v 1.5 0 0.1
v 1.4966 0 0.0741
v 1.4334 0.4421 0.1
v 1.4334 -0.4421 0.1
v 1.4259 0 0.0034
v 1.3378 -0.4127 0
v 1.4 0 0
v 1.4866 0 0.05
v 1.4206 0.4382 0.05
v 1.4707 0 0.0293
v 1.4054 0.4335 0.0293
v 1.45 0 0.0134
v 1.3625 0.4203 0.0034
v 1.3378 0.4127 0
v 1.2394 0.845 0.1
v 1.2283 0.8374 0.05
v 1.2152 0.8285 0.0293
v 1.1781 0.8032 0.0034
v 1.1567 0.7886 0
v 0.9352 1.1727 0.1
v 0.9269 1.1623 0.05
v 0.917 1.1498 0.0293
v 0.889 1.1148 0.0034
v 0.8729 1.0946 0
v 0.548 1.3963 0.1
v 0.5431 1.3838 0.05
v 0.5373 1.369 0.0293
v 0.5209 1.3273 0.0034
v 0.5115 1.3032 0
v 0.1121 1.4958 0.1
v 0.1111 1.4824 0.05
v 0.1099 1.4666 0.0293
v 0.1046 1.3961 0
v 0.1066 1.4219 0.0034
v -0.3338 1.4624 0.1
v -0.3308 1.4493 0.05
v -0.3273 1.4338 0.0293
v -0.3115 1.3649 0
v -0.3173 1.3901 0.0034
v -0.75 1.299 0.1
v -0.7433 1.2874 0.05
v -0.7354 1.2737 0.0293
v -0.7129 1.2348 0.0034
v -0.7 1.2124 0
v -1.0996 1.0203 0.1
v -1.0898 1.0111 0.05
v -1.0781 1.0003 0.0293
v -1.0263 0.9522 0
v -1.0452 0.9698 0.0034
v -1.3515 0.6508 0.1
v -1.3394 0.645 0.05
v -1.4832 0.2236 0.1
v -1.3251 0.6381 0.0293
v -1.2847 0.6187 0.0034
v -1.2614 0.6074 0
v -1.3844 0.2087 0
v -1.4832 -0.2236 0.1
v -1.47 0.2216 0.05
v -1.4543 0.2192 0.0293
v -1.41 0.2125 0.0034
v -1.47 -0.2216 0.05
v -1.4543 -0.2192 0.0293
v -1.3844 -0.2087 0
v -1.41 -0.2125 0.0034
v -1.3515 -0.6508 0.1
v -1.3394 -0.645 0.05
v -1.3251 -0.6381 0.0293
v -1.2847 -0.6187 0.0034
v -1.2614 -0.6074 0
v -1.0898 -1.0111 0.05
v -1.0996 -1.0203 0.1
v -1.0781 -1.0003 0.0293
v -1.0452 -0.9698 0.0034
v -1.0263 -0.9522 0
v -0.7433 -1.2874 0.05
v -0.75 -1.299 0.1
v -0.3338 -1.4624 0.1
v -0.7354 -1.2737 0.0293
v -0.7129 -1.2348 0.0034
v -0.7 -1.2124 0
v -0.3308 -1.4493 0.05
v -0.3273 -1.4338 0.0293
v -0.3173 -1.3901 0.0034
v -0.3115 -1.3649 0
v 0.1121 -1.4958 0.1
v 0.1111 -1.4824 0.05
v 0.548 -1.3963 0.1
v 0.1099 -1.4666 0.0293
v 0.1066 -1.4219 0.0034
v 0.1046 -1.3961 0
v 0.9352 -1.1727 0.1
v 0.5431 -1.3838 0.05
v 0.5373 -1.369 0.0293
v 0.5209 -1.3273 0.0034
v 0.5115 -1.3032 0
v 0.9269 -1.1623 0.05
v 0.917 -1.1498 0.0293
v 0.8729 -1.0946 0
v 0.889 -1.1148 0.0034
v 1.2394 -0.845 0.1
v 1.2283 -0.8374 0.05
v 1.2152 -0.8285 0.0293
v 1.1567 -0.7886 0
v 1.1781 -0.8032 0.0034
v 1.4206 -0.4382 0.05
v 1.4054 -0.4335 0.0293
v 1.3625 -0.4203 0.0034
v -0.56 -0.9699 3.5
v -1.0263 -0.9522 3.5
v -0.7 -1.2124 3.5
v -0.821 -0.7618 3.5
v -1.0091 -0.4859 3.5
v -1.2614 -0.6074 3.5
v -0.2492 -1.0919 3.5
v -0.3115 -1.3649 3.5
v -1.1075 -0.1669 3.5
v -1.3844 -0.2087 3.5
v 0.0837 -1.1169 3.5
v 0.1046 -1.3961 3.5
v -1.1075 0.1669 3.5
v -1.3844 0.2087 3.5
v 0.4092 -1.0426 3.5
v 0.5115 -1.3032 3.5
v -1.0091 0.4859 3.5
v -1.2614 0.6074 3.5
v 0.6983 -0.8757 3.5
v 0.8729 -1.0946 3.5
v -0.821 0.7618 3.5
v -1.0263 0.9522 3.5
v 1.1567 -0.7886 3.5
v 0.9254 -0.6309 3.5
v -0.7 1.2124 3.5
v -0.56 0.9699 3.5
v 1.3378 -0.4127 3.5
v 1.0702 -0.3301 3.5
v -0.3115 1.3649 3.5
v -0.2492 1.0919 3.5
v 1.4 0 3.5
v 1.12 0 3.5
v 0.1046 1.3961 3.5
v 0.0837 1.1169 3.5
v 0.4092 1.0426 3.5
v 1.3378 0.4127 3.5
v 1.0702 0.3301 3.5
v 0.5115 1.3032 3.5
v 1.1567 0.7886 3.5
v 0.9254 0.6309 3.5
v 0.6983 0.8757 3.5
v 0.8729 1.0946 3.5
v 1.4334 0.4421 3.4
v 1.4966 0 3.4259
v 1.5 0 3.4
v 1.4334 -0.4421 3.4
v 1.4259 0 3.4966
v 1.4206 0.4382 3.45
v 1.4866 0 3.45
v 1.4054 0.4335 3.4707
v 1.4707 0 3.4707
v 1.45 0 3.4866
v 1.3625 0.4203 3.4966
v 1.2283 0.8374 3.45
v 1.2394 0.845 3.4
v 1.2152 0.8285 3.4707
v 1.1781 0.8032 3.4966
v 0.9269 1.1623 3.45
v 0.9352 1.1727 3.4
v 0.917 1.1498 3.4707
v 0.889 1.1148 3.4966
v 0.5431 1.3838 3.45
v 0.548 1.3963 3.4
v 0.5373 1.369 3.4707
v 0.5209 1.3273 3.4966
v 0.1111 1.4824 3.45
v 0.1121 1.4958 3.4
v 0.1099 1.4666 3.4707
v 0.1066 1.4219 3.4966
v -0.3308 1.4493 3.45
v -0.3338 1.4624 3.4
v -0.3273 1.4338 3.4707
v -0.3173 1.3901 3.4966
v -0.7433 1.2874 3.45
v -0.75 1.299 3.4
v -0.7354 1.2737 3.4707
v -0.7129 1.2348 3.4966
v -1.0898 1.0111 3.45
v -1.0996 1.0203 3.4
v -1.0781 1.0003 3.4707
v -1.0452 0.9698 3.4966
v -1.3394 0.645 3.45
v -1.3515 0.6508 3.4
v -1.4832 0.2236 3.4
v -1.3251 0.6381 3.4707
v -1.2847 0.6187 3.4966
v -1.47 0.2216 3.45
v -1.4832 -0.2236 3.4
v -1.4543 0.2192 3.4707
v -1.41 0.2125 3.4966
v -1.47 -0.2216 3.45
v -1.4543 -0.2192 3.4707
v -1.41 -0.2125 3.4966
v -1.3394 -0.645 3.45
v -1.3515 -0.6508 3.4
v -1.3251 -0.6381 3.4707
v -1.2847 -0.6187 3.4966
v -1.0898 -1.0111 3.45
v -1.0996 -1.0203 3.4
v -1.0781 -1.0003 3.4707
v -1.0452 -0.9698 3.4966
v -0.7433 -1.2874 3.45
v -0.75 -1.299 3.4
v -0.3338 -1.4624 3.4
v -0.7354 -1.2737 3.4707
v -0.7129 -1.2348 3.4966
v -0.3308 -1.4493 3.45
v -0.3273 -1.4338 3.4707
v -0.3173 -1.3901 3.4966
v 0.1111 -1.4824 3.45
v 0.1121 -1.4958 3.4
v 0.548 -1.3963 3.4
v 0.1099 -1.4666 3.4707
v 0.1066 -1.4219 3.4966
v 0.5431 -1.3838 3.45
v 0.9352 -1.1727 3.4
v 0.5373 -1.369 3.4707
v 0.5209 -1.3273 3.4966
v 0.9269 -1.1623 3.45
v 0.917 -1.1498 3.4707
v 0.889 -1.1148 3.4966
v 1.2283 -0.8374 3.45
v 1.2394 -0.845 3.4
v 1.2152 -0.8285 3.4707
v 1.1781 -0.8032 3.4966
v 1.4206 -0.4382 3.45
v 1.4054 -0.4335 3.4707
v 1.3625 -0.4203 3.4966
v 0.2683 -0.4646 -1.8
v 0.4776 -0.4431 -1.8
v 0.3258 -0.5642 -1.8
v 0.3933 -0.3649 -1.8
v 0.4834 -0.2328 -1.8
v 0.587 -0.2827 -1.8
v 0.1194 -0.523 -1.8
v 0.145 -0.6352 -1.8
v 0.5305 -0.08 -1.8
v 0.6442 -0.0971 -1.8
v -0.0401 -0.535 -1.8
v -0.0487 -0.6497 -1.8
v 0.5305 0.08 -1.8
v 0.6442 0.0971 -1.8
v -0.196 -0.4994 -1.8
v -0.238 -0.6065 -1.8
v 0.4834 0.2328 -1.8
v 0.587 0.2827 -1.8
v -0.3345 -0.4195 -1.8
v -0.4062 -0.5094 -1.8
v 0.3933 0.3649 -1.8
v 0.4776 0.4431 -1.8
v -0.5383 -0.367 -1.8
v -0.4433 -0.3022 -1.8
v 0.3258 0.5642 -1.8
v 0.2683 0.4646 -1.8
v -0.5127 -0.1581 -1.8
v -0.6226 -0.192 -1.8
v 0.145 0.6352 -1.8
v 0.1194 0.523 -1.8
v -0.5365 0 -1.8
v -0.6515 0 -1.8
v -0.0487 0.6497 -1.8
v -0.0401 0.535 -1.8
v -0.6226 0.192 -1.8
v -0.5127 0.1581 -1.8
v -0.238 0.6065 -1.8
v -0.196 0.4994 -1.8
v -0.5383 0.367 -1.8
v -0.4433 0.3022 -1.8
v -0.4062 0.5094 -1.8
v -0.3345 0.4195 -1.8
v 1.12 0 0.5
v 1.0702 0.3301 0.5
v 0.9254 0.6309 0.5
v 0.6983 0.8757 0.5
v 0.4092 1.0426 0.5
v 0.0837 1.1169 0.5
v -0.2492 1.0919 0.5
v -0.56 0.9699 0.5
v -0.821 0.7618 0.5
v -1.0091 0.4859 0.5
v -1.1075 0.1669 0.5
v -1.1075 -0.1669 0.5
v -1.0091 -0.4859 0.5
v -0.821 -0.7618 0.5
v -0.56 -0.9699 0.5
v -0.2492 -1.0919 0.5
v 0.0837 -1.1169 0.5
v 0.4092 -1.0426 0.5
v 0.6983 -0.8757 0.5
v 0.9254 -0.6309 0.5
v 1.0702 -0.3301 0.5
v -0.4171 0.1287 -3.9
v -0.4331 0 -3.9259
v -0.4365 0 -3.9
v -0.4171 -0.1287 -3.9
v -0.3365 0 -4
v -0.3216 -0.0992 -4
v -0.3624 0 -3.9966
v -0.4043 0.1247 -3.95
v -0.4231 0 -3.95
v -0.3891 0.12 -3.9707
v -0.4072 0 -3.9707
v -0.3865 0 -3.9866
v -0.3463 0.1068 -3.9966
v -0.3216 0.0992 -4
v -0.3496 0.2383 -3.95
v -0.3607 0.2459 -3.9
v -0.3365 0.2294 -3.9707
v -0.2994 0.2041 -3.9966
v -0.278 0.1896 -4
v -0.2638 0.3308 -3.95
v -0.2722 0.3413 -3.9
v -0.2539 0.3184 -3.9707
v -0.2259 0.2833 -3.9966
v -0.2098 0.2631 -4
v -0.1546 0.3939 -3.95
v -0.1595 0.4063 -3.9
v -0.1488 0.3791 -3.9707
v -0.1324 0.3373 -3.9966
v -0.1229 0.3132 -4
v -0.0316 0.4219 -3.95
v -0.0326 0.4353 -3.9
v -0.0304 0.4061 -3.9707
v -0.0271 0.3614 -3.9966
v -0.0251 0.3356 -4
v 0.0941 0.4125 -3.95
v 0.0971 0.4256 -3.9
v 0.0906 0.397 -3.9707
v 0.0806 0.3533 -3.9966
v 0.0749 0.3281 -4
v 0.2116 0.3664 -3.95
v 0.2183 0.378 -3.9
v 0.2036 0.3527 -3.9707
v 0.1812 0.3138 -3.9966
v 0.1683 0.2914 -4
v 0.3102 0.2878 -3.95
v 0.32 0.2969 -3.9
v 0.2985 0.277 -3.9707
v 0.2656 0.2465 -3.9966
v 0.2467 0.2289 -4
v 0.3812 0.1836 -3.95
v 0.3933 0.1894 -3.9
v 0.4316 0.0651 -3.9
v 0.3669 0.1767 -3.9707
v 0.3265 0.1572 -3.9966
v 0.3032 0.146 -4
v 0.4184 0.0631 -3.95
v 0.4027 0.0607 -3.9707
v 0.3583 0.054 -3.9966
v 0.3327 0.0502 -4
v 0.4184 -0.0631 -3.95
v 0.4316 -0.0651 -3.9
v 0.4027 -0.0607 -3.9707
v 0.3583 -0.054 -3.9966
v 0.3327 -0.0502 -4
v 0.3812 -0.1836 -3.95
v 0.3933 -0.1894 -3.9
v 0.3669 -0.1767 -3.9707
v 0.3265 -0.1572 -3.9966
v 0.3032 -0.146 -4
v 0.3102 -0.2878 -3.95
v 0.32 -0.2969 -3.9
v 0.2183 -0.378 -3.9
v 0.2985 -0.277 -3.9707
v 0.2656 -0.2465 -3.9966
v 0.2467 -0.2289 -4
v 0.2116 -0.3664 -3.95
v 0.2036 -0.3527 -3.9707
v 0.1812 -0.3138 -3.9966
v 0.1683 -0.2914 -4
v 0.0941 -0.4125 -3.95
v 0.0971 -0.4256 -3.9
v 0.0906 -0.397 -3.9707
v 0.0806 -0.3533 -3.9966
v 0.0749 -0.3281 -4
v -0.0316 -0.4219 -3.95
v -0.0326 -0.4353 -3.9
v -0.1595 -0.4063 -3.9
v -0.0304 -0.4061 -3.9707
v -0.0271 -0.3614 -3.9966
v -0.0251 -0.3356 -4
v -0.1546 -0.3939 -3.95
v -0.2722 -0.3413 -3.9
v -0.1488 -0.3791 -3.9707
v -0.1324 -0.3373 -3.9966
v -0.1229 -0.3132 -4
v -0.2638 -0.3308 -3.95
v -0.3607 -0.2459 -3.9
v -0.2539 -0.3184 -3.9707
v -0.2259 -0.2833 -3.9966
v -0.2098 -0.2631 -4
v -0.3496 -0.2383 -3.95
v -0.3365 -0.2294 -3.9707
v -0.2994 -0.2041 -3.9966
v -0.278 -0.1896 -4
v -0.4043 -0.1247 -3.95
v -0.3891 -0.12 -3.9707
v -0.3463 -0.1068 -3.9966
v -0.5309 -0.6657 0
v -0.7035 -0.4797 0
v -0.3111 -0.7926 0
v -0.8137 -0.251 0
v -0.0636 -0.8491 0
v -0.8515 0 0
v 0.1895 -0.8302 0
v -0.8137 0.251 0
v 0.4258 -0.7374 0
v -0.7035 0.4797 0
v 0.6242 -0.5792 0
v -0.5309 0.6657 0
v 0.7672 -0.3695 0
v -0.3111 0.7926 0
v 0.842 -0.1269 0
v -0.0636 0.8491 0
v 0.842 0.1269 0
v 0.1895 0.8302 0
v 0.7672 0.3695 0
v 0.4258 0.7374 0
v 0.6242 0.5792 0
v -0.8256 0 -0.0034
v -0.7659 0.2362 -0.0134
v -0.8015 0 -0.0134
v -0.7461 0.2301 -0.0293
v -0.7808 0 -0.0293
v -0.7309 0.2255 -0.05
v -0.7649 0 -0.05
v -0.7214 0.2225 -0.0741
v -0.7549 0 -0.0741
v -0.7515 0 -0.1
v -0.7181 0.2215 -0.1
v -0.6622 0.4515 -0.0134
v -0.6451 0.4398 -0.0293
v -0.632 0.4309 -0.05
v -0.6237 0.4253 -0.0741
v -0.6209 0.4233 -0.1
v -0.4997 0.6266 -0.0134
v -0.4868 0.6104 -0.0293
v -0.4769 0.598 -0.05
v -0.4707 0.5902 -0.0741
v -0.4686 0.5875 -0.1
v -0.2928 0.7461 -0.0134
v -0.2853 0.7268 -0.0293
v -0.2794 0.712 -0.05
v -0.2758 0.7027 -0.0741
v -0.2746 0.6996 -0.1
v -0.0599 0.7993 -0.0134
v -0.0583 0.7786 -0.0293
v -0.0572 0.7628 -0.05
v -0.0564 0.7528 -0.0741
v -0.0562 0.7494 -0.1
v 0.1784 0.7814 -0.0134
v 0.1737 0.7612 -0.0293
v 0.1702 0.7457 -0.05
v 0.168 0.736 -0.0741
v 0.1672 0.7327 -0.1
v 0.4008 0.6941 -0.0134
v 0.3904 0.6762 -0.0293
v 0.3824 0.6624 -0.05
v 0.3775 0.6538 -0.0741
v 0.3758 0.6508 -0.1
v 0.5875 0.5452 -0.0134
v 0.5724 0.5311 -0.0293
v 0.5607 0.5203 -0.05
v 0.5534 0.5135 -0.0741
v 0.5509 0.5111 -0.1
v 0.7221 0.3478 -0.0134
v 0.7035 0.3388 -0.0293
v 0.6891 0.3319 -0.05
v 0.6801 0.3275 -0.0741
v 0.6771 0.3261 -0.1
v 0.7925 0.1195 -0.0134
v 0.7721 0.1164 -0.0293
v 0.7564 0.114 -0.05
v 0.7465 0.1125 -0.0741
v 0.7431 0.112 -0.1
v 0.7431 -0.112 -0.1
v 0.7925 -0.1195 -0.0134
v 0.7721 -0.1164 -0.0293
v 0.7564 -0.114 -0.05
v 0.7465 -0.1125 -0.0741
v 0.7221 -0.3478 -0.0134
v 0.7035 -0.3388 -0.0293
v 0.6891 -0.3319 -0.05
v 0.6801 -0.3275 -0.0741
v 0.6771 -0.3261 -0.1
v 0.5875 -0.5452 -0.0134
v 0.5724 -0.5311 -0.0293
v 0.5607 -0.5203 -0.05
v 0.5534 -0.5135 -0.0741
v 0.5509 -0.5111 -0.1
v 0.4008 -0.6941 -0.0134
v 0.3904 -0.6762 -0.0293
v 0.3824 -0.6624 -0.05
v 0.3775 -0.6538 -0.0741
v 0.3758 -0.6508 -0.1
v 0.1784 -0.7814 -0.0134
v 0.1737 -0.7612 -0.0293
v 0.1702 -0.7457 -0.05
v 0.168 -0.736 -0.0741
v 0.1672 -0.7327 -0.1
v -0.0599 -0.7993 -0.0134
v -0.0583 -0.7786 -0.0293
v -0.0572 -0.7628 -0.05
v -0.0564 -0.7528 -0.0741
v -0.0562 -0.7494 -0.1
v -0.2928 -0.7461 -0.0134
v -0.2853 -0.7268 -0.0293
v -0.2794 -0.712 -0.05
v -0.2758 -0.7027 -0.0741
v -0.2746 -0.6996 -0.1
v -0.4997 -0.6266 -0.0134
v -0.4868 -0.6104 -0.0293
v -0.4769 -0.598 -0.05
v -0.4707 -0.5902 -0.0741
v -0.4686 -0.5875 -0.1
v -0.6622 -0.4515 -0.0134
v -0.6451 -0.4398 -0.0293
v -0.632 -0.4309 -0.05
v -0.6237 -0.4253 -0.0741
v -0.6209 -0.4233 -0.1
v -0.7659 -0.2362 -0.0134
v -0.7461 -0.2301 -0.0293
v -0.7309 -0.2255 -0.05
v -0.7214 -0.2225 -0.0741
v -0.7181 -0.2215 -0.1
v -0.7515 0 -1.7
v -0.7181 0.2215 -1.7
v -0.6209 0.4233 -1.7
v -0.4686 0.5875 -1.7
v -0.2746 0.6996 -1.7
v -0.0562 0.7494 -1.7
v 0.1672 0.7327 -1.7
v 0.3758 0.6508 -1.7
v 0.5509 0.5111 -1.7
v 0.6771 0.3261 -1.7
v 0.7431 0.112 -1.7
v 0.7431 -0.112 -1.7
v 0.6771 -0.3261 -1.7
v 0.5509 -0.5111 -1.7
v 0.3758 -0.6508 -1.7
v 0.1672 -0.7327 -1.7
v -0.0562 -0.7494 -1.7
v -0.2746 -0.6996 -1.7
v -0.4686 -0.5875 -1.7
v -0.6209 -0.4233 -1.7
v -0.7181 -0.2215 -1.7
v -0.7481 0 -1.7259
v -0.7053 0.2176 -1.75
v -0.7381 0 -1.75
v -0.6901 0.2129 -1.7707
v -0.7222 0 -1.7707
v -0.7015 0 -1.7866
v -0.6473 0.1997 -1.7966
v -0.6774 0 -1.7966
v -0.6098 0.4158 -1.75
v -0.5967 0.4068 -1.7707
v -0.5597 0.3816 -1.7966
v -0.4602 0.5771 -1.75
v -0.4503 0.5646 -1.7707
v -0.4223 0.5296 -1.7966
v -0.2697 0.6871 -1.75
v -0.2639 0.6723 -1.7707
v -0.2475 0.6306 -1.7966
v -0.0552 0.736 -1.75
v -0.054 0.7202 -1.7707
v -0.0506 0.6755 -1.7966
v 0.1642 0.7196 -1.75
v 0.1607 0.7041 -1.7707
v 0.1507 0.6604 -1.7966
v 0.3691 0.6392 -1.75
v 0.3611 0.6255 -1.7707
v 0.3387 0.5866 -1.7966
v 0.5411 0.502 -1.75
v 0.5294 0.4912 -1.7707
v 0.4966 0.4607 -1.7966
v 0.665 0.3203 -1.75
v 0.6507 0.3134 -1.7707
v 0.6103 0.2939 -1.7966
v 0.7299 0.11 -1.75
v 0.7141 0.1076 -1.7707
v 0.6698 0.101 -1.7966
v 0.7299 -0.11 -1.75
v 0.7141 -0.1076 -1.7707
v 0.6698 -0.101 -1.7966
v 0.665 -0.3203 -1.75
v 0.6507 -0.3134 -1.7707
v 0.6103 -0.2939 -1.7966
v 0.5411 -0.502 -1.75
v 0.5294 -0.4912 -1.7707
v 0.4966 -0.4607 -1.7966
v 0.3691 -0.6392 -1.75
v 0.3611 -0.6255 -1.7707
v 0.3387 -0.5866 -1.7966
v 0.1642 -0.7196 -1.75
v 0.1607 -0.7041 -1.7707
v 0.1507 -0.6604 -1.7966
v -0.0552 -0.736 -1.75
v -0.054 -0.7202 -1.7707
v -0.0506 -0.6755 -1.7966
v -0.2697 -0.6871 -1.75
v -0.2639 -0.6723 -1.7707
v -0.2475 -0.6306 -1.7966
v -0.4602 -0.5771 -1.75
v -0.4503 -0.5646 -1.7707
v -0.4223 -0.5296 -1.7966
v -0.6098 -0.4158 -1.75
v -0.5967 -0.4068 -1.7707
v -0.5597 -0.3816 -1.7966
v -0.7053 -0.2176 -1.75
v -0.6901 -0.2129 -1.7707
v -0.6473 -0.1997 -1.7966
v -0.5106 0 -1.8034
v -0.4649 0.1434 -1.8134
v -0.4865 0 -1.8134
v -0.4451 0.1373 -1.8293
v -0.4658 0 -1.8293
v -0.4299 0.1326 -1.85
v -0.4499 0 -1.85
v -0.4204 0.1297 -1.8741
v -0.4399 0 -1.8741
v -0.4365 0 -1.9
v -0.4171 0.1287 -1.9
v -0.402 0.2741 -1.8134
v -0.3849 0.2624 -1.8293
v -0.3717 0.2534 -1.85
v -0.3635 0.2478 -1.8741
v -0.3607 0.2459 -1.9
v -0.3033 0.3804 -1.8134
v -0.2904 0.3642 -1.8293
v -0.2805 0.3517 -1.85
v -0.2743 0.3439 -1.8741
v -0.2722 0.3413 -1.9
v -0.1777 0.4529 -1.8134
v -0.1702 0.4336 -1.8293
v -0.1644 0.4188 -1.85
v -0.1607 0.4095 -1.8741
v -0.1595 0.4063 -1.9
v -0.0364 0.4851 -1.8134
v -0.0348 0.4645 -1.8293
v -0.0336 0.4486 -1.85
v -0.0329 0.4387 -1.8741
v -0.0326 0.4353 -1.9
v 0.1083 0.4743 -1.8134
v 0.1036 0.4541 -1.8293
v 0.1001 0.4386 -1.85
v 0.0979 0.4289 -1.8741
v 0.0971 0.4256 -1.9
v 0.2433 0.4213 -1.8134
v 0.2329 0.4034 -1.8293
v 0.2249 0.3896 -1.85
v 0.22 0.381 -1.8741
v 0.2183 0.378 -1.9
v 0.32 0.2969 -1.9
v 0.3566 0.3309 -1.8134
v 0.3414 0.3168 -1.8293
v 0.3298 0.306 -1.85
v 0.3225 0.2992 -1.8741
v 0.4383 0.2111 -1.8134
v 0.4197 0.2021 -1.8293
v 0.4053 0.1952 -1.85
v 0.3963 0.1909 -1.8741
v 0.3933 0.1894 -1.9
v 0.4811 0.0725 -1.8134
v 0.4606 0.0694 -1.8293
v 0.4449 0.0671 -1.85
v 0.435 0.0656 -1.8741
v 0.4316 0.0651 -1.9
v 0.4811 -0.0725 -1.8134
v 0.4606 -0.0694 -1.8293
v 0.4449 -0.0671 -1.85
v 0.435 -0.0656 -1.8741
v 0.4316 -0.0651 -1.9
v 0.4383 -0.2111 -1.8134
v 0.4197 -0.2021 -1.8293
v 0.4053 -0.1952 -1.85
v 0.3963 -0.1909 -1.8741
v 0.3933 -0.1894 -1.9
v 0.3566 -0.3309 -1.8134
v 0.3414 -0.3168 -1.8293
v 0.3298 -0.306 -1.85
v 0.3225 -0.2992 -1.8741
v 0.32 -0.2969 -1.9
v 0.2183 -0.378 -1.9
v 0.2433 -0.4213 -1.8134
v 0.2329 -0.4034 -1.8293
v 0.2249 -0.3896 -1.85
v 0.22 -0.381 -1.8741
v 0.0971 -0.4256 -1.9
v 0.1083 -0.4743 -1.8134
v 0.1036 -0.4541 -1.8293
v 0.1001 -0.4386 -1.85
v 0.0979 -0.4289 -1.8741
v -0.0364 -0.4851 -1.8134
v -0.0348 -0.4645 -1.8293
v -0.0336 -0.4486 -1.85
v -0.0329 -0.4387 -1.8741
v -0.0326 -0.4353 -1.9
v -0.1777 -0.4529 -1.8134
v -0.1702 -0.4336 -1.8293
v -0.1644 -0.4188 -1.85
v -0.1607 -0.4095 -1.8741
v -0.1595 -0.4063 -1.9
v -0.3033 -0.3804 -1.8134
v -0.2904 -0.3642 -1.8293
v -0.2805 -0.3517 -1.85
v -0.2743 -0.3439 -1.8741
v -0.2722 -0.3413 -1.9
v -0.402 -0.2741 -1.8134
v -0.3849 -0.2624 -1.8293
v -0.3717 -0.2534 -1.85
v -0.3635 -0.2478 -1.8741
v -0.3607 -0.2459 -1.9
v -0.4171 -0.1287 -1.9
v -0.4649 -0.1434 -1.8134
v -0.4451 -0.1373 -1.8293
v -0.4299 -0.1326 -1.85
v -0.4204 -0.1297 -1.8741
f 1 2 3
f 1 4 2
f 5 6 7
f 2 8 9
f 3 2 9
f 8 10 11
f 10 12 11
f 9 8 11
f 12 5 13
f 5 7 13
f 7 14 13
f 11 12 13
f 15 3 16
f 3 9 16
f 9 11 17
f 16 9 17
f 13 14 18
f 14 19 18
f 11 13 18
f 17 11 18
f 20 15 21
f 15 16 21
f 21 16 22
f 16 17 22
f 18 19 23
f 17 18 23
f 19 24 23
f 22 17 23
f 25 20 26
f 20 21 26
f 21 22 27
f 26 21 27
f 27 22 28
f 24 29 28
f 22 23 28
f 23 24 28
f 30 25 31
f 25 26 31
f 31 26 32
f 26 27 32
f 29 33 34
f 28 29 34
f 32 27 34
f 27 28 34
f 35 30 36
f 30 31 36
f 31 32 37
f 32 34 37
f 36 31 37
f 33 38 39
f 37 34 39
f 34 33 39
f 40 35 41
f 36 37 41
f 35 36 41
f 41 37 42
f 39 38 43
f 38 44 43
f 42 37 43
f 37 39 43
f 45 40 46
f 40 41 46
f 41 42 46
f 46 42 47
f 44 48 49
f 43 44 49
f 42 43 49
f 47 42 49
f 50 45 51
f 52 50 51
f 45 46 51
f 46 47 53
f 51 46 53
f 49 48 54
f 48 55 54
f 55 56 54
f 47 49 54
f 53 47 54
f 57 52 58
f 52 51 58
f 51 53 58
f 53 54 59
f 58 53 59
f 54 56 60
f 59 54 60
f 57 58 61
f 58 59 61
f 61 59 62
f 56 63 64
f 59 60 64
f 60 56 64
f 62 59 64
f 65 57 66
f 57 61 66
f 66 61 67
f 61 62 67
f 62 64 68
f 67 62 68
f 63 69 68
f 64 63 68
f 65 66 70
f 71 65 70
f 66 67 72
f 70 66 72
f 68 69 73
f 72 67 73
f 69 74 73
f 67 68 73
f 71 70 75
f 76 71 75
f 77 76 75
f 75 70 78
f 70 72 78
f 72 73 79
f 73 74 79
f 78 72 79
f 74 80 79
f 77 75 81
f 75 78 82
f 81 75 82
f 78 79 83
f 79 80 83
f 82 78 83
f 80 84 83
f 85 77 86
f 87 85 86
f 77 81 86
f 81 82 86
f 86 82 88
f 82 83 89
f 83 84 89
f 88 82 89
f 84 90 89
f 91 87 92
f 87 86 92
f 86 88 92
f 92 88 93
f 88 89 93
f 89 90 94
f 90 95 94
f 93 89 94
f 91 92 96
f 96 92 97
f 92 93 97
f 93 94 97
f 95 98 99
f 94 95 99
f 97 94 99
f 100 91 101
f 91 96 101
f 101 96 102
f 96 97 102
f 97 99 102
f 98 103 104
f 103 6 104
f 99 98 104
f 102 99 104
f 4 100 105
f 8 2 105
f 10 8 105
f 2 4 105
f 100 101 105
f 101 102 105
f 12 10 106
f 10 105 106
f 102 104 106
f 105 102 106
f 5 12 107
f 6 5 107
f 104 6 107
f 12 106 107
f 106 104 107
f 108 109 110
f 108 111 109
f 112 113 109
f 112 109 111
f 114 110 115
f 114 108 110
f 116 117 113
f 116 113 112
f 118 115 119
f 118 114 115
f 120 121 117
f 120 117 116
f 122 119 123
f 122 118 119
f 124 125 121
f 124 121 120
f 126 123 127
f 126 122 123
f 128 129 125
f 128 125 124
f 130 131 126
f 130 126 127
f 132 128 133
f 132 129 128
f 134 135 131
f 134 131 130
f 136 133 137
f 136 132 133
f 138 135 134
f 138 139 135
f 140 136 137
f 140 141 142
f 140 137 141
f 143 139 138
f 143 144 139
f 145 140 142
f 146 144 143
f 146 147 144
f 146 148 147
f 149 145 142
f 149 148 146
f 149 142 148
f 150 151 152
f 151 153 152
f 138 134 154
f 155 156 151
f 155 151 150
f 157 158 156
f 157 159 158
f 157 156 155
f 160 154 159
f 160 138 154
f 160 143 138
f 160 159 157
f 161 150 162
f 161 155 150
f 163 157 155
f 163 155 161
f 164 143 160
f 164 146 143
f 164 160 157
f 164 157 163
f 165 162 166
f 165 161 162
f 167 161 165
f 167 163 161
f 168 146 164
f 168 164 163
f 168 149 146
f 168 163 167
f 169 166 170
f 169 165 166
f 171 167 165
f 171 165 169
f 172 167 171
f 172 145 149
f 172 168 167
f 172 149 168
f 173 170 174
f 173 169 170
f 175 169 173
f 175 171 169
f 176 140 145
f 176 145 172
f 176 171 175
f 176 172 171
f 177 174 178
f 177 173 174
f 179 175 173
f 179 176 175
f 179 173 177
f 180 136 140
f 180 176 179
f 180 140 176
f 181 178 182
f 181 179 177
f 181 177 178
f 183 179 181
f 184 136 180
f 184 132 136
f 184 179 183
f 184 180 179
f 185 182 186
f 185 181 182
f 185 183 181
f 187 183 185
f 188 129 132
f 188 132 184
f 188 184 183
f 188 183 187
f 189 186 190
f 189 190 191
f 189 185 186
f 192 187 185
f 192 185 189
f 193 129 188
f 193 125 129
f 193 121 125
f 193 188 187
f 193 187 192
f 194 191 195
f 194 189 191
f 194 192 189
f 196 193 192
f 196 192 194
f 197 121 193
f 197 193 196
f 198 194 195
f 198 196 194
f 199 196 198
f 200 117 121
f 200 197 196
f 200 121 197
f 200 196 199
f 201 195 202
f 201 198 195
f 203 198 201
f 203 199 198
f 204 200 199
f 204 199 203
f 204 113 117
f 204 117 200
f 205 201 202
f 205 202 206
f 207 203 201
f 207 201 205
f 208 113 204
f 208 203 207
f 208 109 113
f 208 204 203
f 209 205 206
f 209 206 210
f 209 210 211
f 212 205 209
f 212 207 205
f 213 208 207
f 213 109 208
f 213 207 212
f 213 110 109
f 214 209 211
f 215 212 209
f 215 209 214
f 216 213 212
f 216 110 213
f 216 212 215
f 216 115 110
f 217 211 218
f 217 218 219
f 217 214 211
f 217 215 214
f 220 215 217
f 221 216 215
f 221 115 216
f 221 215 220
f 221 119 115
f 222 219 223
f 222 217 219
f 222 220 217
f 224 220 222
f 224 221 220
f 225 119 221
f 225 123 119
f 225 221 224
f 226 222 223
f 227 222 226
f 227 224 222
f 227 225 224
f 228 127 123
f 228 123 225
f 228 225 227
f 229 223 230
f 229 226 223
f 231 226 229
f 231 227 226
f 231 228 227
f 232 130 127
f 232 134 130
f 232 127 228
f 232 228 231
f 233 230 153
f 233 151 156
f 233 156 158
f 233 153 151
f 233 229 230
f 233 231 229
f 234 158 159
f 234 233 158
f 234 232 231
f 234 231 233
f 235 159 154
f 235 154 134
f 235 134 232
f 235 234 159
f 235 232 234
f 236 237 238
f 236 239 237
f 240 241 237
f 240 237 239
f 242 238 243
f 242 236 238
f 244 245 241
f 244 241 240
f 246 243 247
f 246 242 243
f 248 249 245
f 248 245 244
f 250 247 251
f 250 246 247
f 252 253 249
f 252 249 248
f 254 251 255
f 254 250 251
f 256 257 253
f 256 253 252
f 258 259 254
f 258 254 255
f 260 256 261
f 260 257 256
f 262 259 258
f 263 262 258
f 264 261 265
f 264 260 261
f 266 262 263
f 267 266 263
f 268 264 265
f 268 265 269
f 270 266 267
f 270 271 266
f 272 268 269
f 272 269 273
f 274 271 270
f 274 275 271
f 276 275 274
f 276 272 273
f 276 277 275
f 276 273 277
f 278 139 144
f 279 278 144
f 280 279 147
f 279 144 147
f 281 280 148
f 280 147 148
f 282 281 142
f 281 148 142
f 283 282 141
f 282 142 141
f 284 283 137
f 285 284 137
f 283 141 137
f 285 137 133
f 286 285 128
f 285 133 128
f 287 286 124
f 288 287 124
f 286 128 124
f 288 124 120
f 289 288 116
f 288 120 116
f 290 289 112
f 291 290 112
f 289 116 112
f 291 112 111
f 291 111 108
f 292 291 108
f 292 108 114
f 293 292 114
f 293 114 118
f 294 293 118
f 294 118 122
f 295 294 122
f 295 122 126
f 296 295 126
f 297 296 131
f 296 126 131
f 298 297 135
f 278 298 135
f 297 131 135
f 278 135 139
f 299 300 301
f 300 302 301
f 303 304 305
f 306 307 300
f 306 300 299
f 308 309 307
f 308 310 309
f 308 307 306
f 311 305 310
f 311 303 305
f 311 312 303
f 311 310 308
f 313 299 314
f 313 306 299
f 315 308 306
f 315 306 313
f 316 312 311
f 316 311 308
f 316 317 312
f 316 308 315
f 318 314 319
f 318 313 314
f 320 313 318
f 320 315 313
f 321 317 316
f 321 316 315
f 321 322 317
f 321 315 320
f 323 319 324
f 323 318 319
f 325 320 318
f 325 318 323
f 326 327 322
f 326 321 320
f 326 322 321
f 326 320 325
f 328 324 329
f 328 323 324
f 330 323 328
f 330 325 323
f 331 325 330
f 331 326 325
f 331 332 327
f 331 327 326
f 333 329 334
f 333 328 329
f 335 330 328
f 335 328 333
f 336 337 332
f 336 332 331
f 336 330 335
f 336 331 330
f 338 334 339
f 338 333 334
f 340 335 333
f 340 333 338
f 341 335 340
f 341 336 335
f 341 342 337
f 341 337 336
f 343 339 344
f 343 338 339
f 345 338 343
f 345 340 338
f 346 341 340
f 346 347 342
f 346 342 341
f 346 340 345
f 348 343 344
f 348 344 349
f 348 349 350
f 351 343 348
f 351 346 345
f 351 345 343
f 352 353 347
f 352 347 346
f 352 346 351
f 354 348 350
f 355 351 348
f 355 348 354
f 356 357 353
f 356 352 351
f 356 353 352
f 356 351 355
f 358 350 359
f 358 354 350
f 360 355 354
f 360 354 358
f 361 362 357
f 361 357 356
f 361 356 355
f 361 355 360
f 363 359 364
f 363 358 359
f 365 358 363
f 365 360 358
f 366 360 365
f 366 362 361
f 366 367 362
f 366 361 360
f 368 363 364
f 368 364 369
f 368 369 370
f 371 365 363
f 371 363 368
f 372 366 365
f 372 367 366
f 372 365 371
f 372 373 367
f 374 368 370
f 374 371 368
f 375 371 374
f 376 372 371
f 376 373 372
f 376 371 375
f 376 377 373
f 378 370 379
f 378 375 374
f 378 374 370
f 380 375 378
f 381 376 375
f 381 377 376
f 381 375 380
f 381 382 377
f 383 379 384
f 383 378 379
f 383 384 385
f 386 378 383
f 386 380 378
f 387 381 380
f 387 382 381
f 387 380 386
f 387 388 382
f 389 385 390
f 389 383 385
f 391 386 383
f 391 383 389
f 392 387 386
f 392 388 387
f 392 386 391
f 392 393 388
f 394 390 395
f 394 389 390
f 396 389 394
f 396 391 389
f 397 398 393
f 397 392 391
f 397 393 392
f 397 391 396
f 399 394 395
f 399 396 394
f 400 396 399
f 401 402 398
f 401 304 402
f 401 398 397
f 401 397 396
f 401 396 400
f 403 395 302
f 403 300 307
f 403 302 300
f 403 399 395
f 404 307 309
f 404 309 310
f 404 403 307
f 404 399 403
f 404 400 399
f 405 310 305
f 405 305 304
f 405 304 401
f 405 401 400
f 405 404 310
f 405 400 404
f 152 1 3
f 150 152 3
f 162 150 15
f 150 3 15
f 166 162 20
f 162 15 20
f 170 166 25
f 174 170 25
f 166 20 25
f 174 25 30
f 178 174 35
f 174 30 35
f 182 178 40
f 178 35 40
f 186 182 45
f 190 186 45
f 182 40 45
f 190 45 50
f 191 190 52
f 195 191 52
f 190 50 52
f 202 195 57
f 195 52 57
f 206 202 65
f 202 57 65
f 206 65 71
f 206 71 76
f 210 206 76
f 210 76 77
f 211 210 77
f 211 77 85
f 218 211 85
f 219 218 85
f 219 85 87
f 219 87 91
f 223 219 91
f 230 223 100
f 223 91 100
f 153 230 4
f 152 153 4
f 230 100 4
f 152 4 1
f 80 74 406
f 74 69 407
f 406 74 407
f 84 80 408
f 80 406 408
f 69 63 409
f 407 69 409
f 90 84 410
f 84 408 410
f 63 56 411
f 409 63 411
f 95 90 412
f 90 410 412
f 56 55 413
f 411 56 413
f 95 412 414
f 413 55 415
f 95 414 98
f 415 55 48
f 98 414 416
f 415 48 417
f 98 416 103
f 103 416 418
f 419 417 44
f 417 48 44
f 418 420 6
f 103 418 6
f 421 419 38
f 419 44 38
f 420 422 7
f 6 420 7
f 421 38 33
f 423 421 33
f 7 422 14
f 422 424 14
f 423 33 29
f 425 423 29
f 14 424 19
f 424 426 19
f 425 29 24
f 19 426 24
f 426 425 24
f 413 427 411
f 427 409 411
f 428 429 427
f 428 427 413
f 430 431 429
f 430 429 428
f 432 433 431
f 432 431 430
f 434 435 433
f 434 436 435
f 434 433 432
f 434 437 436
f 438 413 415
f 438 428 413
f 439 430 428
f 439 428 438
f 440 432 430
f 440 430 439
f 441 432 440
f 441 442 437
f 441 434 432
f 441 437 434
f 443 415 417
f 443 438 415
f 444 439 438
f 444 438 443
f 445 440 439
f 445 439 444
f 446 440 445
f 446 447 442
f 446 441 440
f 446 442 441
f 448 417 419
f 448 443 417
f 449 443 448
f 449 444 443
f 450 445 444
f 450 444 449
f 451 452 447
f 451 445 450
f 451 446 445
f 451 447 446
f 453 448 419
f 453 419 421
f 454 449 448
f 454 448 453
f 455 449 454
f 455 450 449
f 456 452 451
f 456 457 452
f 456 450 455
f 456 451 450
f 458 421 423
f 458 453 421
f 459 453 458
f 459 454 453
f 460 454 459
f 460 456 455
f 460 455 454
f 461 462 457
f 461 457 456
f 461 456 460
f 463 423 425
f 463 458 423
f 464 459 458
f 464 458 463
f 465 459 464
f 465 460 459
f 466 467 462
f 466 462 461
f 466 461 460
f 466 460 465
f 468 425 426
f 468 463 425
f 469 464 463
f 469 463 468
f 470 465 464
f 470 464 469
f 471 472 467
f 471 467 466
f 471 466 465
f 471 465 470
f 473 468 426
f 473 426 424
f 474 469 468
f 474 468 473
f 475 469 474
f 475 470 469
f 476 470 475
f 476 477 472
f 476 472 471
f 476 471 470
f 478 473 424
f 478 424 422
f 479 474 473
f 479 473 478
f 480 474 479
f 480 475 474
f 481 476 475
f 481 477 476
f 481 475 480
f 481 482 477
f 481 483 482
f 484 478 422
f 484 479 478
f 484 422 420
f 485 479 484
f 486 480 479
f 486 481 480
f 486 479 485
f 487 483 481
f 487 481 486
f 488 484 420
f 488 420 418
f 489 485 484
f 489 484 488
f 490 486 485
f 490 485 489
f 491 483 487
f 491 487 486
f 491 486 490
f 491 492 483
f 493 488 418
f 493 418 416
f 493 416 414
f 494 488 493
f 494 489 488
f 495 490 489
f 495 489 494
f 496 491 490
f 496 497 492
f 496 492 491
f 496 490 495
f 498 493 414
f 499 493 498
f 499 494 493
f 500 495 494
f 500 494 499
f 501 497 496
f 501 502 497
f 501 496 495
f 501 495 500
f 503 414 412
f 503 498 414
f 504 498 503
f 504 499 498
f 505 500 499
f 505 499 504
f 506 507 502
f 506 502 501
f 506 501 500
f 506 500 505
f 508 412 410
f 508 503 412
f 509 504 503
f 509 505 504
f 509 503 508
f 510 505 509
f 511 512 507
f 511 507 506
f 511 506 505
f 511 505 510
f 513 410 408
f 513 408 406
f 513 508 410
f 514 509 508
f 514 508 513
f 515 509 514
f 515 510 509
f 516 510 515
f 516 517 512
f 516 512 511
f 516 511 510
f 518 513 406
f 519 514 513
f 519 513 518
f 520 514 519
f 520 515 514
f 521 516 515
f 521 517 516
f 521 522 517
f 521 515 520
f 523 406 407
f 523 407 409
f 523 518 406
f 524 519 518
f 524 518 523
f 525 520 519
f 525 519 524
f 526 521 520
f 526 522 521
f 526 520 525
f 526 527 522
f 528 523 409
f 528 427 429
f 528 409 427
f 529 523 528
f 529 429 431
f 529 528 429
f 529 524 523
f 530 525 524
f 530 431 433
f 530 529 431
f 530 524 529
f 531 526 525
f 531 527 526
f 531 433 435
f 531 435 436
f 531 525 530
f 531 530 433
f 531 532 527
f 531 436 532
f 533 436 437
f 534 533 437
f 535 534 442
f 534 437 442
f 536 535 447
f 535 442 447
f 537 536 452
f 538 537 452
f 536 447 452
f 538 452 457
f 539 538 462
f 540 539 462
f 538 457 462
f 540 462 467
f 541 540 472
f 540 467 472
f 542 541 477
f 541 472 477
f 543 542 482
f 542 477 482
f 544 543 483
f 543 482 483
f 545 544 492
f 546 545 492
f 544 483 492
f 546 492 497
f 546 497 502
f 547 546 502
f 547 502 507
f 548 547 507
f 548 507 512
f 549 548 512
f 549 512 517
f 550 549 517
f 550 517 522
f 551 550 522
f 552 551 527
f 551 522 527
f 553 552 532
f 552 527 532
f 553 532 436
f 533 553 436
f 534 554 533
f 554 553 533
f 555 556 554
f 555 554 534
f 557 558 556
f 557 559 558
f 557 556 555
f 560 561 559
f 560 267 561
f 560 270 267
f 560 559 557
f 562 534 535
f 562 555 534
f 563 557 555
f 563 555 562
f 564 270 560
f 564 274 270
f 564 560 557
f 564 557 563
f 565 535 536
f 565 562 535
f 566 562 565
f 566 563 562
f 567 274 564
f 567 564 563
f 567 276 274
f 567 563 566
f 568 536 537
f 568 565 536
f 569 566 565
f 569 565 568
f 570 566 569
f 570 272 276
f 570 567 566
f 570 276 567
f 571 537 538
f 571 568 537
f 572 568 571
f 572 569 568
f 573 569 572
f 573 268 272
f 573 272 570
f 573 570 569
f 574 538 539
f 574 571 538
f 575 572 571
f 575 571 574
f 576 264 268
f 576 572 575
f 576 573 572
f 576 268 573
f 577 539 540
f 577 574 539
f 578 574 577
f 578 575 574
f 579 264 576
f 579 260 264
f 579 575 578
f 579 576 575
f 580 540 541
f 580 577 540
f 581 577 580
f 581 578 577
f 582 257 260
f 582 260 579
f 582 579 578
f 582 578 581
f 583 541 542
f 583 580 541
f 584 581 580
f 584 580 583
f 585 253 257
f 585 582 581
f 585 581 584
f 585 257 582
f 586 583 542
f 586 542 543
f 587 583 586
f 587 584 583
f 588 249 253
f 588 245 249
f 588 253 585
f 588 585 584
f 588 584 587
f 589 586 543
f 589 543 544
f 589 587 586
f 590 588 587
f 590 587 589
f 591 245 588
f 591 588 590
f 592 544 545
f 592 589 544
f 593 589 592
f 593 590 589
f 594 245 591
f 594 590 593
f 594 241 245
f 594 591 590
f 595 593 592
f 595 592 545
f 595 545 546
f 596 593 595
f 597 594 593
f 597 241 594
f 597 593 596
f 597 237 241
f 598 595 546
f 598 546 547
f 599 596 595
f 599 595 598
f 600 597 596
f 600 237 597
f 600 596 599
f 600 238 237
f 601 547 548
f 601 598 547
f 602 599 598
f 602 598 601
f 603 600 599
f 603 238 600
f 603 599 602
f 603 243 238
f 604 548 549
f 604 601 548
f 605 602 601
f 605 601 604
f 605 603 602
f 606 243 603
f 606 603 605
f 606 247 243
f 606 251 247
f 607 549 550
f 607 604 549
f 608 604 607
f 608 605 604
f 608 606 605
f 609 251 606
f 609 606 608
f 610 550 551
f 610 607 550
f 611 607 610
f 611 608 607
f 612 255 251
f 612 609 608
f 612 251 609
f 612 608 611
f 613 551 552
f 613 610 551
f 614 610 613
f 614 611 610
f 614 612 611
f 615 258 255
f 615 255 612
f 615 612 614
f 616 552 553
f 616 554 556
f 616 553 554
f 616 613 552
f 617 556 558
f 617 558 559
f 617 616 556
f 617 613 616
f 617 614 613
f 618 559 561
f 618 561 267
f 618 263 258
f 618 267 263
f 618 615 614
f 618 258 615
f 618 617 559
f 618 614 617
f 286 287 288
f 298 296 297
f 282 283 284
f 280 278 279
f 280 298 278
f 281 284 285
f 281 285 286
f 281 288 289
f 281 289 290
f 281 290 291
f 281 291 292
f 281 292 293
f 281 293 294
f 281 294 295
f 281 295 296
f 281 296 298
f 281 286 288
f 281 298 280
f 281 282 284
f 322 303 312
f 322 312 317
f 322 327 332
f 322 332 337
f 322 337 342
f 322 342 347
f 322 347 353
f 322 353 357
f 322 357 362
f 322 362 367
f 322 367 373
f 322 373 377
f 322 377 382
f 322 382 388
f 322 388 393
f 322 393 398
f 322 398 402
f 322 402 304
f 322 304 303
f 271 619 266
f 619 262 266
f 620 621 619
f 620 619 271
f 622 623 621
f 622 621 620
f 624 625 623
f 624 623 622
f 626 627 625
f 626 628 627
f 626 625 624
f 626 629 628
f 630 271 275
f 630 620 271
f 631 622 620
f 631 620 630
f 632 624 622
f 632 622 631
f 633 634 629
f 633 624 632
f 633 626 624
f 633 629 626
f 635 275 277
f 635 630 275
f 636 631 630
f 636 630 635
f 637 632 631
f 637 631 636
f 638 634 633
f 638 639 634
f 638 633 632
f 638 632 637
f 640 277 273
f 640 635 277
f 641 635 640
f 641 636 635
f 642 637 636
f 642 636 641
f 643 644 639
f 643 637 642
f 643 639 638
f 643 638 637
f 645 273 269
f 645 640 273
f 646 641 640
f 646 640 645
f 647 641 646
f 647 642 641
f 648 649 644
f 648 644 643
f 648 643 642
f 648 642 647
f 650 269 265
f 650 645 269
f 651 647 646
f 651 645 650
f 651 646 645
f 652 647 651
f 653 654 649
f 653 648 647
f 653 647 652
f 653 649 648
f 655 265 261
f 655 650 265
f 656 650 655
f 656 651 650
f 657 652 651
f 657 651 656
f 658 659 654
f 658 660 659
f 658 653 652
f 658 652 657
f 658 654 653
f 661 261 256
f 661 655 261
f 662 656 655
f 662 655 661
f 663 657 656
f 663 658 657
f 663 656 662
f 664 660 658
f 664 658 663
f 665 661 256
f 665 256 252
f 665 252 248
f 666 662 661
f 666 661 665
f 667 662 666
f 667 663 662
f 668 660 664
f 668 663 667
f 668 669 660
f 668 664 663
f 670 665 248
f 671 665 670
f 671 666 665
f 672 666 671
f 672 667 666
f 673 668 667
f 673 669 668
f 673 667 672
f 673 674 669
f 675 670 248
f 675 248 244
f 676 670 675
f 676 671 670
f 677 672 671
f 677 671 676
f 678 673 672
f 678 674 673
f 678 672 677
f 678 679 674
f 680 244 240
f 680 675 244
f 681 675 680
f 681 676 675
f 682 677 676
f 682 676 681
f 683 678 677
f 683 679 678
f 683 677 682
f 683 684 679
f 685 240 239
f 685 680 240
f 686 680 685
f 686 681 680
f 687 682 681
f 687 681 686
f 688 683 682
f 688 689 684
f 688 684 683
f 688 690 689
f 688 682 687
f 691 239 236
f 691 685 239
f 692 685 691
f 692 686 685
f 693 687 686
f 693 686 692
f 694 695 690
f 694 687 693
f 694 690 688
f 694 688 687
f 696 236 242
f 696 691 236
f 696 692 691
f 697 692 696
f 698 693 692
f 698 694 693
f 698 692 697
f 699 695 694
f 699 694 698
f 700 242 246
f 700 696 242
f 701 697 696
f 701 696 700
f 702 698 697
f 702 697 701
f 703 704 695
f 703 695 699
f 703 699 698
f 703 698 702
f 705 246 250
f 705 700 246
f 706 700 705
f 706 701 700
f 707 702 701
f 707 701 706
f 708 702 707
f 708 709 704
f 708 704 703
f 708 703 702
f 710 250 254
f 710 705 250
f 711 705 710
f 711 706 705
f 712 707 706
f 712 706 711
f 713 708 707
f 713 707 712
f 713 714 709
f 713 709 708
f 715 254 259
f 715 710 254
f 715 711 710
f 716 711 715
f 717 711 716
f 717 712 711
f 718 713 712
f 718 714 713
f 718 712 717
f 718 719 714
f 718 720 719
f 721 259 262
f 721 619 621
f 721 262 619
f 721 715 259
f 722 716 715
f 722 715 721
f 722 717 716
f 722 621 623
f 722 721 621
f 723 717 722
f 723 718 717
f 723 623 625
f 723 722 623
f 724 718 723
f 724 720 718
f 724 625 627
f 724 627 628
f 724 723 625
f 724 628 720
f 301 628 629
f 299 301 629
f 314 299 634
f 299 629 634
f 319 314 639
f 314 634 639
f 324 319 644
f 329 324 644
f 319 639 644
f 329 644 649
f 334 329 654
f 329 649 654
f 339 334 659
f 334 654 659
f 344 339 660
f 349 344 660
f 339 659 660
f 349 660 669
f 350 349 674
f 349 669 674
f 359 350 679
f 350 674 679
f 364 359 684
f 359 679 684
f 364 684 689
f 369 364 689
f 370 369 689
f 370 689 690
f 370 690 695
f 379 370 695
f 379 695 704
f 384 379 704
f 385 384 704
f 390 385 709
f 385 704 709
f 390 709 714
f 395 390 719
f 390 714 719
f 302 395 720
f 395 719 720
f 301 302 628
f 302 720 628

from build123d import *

# Parameters (mm, degrees)
SKETCH1_R           = 1.5
BOSS_EXTRUDE1_DEPTH = 3.5
SKETCH2_R           = 1.12
CUT_EXTRUDE1_DEPTH  = 3
SKETCH3_R           = 0.7515
BOSS_EXTRUDE2_DEPTH = 1.8
SKETCH4_R           = 0.4365
BOSS_EXTRUDE3_DEPTH = 2.2
FILLET1_R           = 0.1


with BuildPart() as part:
    # Sketch1 → Boss-Extrude1 (new body)
    with BuildSketch(Plane.XY):
        Circle(SKETCH1_R)
    extrude(amount=BOSS_EXTRUDE1_DEPTH)

    # Sketch2 → Cut-Extrude1 (cut)
    with BuildSketch(Plane.XY.offset(3.5)):
        Circle(SKETCH2_R)
    extrude(amount=-CUT_EXTRUDE1_DEPTH, mode=Mode.SUBTRACT)

    # Sketch3 → Boss-Extrude2 (add)
    with BuildSketch(Plane(origin=(0, 0, 0), x_dir=(-1, 0, 0), z_dir=(0, 0, -1))):
        Circle(SKETCH3_R)
    extrude(amount=BOSS_EXTRUDE2_DEPTH)

    # Sketch4 → Boss-Extrude3 (add)
    with BuildSketch(Plane(origin=(0, 0, -1.8), x_dir=(-1, 0, 0), z_dir=(0, 0, -1))):
        Circle(SKETCH4_R)
    extrude(amount=BOSS_EXTRUDE3_DEPTH)

    # Fillet1
    fillet1_edges = [part.edges().sort_by_distance(p)[0] for p in [
        (0.7515, 0, -1.8),
        (0.4365, 0, -1.8),
        (0.4365, 0, -4),
        (-1.5, 0, 0),
        (-1.5, 0, 3.5),
        (0.7515, 0, 0),
    ]]
    fillet(fillet1_edges, radius=FILLET1_R)


solid = part.part
